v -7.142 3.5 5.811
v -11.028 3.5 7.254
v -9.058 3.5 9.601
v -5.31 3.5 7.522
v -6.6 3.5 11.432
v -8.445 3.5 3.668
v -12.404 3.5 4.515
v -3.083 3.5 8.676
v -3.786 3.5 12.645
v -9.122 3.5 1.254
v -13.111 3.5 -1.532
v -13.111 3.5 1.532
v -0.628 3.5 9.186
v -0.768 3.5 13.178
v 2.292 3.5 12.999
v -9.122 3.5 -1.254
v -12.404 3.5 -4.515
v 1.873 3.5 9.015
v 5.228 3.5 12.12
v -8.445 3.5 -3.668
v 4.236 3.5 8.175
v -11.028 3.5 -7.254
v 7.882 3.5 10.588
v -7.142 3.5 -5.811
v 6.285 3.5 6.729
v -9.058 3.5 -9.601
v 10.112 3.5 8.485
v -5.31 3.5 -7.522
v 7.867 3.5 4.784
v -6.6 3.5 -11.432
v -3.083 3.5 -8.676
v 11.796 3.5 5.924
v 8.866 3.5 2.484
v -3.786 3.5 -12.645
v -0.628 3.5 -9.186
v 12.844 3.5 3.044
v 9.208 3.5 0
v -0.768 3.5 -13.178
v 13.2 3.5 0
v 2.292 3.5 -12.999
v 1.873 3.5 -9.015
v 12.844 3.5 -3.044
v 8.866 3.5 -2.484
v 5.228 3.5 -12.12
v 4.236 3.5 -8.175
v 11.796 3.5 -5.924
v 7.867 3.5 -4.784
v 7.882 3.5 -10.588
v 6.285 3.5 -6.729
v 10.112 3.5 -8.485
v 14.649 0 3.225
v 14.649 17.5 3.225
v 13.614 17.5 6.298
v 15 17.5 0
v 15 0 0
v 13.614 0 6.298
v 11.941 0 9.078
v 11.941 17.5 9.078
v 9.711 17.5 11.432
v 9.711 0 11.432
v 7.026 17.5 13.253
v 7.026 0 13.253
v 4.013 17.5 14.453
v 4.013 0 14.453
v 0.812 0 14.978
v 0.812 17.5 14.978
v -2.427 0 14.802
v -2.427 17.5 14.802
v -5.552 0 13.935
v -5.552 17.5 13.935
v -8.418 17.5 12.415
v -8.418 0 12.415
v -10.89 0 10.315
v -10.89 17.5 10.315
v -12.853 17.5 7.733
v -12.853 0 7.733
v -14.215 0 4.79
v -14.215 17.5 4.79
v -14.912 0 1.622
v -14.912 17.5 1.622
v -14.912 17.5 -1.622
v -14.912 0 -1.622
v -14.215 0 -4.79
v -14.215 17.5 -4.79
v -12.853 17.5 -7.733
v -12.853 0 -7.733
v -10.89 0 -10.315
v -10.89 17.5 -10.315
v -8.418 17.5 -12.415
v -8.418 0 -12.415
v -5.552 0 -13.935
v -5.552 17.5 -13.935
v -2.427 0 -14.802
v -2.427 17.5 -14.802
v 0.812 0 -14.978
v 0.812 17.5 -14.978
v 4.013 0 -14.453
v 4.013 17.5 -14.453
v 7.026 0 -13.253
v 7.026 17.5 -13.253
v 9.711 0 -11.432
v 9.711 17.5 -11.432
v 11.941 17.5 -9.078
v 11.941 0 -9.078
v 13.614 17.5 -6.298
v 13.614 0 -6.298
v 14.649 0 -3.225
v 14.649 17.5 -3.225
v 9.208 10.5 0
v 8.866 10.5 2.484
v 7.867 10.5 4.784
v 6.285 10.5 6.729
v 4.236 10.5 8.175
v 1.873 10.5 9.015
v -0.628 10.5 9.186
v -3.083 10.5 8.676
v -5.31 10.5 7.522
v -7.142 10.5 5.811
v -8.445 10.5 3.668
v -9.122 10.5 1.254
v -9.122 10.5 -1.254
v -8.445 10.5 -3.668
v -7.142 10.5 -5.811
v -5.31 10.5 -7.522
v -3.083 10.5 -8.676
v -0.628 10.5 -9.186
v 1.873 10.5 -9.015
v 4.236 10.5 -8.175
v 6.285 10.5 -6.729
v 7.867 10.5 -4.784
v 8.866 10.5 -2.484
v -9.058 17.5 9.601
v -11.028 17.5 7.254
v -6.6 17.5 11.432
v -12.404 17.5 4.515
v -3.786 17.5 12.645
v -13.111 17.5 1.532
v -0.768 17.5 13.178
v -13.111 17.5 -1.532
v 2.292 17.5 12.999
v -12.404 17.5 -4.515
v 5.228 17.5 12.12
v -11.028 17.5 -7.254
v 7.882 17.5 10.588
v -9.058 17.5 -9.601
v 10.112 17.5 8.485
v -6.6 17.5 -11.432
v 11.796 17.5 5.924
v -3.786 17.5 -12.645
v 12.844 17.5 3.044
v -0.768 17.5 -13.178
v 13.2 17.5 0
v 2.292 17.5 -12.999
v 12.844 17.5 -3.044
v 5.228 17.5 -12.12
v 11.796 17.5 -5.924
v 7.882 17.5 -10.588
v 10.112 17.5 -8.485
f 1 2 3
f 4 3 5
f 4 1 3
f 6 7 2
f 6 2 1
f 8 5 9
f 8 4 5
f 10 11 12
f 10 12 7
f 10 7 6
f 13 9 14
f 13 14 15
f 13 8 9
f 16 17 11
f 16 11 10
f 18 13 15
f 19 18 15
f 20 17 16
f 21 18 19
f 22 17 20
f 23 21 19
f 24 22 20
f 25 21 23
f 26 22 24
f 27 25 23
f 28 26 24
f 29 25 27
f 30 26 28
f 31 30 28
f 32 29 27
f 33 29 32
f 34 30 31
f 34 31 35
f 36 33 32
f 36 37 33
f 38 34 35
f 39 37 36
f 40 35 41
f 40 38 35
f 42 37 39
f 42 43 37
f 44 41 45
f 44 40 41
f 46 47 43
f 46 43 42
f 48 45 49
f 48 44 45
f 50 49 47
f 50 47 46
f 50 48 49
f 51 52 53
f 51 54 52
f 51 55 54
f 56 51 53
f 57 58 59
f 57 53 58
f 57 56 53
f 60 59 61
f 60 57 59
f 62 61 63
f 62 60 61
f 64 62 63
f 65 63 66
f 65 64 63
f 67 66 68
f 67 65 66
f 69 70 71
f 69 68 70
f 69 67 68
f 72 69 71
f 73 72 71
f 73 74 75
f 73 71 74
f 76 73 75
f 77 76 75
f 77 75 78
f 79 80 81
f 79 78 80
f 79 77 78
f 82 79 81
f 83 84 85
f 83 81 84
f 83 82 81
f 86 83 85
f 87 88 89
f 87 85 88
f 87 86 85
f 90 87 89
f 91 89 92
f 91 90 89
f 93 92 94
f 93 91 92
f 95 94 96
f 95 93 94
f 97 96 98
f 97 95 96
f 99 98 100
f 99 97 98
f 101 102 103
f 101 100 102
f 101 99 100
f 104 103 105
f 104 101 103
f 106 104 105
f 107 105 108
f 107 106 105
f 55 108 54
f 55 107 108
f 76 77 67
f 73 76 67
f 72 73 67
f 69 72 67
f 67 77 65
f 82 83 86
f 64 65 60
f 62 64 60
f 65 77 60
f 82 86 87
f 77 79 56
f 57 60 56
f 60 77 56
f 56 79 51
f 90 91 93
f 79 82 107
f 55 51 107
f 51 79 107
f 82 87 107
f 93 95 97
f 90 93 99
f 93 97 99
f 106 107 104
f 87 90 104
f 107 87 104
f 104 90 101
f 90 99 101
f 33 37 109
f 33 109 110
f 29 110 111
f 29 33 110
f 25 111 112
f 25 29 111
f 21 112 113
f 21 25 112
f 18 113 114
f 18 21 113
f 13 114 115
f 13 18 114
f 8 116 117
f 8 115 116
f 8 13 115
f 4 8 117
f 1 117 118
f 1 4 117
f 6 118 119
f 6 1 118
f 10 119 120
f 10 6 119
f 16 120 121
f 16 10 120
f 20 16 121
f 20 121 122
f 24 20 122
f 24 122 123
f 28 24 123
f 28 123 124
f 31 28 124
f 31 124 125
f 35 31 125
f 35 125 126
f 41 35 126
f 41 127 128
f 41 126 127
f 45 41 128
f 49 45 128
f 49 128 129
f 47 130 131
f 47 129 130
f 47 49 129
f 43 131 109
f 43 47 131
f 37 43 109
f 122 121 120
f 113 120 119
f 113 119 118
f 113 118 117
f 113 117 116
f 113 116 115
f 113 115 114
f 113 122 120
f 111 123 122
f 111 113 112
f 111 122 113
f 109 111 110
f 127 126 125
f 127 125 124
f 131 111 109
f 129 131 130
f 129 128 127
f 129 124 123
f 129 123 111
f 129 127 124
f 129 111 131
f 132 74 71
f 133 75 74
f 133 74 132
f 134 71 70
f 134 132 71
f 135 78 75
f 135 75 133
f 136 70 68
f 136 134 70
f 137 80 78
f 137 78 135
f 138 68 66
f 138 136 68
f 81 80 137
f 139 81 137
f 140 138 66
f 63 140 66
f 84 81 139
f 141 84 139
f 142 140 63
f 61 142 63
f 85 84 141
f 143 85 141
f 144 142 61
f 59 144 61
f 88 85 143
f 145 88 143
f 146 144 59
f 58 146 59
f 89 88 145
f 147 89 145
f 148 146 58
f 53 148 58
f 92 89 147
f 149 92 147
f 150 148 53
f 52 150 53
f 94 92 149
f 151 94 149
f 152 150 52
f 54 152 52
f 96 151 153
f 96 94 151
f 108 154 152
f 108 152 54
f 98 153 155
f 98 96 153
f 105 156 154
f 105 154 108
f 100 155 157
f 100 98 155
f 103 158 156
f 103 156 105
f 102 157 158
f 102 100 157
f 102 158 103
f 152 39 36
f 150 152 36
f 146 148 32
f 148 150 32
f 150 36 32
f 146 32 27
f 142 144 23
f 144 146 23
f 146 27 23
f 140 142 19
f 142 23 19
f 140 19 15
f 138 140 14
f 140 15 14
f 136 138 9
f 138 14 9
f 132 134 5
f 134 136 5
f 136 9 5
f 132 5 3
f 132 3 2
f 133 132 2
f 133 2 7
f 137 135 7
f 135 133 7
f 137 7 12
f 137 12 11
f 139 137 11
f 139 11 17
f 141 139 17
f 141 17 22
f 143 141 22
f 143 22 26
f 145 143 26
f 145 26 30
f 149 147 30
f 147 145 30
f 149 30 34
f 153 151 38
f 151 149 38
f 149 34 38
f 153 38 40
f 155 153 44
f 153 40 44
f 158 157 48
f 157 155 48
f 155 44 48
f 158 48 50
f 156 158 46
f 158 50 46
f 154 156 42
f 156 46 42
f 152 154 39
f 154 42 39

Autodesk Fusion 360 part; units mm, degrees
sketch "Sketch1" plane through (0, 0, 0) normal (0, 1, 0) x (1, 0, 0)
  circle A0 centre (0, 0) radius 15
  dimension "d1" = 30
extrude "Extrude1" add sketch "Sketch1" along normal blind 3.5
ref_plane "WorkPlane1" through (0, 3.5, 0) normal (0, 1, 0) x (1, 0, 0)
sketch "Sketch2" plane through (0, 3.5, 0) normal (0, 1, 0) x (1, 0, 0)
  circle A0 centre (0, 0) radius 9.2075
  dimension "d5" = 18.415
extrude "Extrude2" add sketch "Sketch2" along normal blind 7
ref_plane "WorkPlane2" through (0, 3.5, 0) normal (0, 1, 0) x (1, 0, 0)
sketch "Sketch3" plane through (0, 3.5, 0) normal (0, 1, 0) x (1, 0, 0)
  circle A0 centre (0, 0) radius 15
  circle A1 centre (0, 0) radius 13.2
  dimension "d9" = 26.4
extrude "Extrude3" add sketch "Sketch3" along normal blind 14
